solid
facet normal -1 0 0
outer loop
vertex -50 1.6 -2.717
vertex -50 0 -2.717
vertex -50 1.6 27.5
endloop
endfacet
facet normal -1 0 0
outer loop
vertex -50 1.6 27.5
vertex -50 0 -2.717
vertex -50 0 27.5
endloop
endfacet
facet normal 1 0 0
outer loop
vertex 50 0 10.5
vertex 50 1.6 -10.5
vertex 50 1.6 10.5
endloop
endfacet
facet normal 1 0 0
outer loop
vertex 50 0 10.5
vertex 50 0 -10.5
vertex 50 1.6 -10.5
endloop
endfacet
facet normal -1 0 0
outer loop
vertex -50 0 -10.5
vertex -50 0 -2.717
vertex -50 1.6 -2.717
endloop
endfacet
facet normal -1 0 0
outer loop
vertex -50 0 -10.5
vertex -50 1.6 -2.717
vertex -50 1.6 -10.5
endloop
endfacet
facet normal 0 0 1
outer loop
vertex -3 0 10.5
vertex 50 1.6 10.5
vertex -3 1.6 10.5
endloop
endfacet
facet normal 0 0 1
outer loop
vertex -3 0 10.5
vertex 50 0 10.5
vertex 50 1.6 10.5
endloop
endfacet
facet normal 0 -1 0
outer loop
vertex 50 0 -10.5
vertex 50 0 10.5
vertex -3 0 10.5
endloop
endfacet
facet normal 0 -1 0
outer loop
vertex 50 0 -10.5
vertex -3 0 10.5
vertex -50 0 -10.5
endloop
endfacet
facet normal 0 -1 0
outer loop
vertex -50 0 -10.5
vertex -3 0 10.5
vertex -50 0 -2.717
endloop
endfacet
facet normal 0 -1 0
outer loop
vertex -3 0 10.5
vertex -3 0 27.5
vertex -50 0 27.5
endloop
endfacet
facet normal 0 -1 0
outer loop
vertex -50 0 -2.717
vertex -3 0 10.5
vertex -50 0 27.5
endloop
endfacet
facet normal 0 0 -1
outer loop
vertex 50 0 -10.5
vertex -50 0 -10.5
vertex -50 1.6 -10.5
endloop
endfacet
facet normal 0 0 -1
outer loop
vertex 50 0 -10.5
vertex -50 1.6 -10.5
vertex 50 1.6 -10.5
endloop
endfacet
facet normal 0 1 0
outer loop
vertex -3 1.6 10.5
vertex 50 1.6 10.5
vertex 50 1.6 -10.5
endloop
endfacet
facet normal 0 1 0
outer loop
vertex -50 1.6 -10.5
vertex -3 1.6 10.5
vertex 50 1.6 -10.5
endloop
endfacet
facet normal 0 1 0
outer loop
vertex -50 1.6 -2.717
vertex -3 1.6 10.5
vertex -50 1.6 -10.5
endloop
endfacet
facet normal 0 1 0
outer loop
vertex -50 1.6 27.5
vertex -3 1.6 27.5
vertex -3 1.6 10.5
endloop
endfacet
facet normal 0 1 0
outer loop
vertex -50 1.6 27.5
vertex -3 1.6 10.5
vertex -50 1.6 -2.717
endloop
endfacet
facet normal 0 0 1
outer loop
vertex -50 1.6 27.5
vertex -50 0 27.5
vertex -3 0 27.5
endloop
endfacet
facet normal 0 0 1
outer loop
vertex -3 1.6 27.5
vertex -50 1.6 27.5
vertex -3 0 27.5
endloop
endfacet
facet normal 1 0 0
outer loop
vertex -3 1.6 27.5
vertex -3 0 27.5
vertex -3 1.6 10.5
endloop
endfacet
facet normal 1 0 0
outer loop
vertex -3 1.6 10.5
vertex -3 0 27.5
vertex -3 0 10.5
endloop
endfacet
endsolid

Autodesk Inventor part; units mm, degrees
ref_plane "YZ Plane" through (0, 0, 0) normal (1, 0, 0) x (0, 1, 0)
ref_plane "XZ Plane" through (0, 0, 0) normal (0, 1, 0) x (-1, 0, 0)
ref_plane "XY Plane" through (0, 0, 0) normal (0, 0, 1) x (1, 0, 0)
sketch "Sketch1" plane through (0, 0, 0) normal (0, 1, 0) x (-1, 0, 0)
  line L0 (-50, 10.5) -> (3, 10.5)
  line L1 (50, -2.7166) -> (50, -10.5)
  line L2 (50, -10.5) -> (-50, -10.5)
  line L3 (-50, -10.5) -> (-50, 10.5)
  line L4 (50, -2.7166) -> (50, 27.5)
  line L5 (50, 27.5) -> (3, 27.5)
  line L6 (3, 27.5) -> (3, 10.5)
  point P0 (0, 0)
  dimension "d0" = 47
  dimension "d1" = 17
  dimension "d2" = 100
  dimension "d3" = 21
  dimension "d4" = 10.5
  dimension "d5" = 50
extrude "Extrusion1" add sketch "Sketch1" along normal blind 1.6
equation "\"d4\" = 0.5 * d3"
equation "\"d5\" = 0.5 * d2"
properties part number "pcb"
